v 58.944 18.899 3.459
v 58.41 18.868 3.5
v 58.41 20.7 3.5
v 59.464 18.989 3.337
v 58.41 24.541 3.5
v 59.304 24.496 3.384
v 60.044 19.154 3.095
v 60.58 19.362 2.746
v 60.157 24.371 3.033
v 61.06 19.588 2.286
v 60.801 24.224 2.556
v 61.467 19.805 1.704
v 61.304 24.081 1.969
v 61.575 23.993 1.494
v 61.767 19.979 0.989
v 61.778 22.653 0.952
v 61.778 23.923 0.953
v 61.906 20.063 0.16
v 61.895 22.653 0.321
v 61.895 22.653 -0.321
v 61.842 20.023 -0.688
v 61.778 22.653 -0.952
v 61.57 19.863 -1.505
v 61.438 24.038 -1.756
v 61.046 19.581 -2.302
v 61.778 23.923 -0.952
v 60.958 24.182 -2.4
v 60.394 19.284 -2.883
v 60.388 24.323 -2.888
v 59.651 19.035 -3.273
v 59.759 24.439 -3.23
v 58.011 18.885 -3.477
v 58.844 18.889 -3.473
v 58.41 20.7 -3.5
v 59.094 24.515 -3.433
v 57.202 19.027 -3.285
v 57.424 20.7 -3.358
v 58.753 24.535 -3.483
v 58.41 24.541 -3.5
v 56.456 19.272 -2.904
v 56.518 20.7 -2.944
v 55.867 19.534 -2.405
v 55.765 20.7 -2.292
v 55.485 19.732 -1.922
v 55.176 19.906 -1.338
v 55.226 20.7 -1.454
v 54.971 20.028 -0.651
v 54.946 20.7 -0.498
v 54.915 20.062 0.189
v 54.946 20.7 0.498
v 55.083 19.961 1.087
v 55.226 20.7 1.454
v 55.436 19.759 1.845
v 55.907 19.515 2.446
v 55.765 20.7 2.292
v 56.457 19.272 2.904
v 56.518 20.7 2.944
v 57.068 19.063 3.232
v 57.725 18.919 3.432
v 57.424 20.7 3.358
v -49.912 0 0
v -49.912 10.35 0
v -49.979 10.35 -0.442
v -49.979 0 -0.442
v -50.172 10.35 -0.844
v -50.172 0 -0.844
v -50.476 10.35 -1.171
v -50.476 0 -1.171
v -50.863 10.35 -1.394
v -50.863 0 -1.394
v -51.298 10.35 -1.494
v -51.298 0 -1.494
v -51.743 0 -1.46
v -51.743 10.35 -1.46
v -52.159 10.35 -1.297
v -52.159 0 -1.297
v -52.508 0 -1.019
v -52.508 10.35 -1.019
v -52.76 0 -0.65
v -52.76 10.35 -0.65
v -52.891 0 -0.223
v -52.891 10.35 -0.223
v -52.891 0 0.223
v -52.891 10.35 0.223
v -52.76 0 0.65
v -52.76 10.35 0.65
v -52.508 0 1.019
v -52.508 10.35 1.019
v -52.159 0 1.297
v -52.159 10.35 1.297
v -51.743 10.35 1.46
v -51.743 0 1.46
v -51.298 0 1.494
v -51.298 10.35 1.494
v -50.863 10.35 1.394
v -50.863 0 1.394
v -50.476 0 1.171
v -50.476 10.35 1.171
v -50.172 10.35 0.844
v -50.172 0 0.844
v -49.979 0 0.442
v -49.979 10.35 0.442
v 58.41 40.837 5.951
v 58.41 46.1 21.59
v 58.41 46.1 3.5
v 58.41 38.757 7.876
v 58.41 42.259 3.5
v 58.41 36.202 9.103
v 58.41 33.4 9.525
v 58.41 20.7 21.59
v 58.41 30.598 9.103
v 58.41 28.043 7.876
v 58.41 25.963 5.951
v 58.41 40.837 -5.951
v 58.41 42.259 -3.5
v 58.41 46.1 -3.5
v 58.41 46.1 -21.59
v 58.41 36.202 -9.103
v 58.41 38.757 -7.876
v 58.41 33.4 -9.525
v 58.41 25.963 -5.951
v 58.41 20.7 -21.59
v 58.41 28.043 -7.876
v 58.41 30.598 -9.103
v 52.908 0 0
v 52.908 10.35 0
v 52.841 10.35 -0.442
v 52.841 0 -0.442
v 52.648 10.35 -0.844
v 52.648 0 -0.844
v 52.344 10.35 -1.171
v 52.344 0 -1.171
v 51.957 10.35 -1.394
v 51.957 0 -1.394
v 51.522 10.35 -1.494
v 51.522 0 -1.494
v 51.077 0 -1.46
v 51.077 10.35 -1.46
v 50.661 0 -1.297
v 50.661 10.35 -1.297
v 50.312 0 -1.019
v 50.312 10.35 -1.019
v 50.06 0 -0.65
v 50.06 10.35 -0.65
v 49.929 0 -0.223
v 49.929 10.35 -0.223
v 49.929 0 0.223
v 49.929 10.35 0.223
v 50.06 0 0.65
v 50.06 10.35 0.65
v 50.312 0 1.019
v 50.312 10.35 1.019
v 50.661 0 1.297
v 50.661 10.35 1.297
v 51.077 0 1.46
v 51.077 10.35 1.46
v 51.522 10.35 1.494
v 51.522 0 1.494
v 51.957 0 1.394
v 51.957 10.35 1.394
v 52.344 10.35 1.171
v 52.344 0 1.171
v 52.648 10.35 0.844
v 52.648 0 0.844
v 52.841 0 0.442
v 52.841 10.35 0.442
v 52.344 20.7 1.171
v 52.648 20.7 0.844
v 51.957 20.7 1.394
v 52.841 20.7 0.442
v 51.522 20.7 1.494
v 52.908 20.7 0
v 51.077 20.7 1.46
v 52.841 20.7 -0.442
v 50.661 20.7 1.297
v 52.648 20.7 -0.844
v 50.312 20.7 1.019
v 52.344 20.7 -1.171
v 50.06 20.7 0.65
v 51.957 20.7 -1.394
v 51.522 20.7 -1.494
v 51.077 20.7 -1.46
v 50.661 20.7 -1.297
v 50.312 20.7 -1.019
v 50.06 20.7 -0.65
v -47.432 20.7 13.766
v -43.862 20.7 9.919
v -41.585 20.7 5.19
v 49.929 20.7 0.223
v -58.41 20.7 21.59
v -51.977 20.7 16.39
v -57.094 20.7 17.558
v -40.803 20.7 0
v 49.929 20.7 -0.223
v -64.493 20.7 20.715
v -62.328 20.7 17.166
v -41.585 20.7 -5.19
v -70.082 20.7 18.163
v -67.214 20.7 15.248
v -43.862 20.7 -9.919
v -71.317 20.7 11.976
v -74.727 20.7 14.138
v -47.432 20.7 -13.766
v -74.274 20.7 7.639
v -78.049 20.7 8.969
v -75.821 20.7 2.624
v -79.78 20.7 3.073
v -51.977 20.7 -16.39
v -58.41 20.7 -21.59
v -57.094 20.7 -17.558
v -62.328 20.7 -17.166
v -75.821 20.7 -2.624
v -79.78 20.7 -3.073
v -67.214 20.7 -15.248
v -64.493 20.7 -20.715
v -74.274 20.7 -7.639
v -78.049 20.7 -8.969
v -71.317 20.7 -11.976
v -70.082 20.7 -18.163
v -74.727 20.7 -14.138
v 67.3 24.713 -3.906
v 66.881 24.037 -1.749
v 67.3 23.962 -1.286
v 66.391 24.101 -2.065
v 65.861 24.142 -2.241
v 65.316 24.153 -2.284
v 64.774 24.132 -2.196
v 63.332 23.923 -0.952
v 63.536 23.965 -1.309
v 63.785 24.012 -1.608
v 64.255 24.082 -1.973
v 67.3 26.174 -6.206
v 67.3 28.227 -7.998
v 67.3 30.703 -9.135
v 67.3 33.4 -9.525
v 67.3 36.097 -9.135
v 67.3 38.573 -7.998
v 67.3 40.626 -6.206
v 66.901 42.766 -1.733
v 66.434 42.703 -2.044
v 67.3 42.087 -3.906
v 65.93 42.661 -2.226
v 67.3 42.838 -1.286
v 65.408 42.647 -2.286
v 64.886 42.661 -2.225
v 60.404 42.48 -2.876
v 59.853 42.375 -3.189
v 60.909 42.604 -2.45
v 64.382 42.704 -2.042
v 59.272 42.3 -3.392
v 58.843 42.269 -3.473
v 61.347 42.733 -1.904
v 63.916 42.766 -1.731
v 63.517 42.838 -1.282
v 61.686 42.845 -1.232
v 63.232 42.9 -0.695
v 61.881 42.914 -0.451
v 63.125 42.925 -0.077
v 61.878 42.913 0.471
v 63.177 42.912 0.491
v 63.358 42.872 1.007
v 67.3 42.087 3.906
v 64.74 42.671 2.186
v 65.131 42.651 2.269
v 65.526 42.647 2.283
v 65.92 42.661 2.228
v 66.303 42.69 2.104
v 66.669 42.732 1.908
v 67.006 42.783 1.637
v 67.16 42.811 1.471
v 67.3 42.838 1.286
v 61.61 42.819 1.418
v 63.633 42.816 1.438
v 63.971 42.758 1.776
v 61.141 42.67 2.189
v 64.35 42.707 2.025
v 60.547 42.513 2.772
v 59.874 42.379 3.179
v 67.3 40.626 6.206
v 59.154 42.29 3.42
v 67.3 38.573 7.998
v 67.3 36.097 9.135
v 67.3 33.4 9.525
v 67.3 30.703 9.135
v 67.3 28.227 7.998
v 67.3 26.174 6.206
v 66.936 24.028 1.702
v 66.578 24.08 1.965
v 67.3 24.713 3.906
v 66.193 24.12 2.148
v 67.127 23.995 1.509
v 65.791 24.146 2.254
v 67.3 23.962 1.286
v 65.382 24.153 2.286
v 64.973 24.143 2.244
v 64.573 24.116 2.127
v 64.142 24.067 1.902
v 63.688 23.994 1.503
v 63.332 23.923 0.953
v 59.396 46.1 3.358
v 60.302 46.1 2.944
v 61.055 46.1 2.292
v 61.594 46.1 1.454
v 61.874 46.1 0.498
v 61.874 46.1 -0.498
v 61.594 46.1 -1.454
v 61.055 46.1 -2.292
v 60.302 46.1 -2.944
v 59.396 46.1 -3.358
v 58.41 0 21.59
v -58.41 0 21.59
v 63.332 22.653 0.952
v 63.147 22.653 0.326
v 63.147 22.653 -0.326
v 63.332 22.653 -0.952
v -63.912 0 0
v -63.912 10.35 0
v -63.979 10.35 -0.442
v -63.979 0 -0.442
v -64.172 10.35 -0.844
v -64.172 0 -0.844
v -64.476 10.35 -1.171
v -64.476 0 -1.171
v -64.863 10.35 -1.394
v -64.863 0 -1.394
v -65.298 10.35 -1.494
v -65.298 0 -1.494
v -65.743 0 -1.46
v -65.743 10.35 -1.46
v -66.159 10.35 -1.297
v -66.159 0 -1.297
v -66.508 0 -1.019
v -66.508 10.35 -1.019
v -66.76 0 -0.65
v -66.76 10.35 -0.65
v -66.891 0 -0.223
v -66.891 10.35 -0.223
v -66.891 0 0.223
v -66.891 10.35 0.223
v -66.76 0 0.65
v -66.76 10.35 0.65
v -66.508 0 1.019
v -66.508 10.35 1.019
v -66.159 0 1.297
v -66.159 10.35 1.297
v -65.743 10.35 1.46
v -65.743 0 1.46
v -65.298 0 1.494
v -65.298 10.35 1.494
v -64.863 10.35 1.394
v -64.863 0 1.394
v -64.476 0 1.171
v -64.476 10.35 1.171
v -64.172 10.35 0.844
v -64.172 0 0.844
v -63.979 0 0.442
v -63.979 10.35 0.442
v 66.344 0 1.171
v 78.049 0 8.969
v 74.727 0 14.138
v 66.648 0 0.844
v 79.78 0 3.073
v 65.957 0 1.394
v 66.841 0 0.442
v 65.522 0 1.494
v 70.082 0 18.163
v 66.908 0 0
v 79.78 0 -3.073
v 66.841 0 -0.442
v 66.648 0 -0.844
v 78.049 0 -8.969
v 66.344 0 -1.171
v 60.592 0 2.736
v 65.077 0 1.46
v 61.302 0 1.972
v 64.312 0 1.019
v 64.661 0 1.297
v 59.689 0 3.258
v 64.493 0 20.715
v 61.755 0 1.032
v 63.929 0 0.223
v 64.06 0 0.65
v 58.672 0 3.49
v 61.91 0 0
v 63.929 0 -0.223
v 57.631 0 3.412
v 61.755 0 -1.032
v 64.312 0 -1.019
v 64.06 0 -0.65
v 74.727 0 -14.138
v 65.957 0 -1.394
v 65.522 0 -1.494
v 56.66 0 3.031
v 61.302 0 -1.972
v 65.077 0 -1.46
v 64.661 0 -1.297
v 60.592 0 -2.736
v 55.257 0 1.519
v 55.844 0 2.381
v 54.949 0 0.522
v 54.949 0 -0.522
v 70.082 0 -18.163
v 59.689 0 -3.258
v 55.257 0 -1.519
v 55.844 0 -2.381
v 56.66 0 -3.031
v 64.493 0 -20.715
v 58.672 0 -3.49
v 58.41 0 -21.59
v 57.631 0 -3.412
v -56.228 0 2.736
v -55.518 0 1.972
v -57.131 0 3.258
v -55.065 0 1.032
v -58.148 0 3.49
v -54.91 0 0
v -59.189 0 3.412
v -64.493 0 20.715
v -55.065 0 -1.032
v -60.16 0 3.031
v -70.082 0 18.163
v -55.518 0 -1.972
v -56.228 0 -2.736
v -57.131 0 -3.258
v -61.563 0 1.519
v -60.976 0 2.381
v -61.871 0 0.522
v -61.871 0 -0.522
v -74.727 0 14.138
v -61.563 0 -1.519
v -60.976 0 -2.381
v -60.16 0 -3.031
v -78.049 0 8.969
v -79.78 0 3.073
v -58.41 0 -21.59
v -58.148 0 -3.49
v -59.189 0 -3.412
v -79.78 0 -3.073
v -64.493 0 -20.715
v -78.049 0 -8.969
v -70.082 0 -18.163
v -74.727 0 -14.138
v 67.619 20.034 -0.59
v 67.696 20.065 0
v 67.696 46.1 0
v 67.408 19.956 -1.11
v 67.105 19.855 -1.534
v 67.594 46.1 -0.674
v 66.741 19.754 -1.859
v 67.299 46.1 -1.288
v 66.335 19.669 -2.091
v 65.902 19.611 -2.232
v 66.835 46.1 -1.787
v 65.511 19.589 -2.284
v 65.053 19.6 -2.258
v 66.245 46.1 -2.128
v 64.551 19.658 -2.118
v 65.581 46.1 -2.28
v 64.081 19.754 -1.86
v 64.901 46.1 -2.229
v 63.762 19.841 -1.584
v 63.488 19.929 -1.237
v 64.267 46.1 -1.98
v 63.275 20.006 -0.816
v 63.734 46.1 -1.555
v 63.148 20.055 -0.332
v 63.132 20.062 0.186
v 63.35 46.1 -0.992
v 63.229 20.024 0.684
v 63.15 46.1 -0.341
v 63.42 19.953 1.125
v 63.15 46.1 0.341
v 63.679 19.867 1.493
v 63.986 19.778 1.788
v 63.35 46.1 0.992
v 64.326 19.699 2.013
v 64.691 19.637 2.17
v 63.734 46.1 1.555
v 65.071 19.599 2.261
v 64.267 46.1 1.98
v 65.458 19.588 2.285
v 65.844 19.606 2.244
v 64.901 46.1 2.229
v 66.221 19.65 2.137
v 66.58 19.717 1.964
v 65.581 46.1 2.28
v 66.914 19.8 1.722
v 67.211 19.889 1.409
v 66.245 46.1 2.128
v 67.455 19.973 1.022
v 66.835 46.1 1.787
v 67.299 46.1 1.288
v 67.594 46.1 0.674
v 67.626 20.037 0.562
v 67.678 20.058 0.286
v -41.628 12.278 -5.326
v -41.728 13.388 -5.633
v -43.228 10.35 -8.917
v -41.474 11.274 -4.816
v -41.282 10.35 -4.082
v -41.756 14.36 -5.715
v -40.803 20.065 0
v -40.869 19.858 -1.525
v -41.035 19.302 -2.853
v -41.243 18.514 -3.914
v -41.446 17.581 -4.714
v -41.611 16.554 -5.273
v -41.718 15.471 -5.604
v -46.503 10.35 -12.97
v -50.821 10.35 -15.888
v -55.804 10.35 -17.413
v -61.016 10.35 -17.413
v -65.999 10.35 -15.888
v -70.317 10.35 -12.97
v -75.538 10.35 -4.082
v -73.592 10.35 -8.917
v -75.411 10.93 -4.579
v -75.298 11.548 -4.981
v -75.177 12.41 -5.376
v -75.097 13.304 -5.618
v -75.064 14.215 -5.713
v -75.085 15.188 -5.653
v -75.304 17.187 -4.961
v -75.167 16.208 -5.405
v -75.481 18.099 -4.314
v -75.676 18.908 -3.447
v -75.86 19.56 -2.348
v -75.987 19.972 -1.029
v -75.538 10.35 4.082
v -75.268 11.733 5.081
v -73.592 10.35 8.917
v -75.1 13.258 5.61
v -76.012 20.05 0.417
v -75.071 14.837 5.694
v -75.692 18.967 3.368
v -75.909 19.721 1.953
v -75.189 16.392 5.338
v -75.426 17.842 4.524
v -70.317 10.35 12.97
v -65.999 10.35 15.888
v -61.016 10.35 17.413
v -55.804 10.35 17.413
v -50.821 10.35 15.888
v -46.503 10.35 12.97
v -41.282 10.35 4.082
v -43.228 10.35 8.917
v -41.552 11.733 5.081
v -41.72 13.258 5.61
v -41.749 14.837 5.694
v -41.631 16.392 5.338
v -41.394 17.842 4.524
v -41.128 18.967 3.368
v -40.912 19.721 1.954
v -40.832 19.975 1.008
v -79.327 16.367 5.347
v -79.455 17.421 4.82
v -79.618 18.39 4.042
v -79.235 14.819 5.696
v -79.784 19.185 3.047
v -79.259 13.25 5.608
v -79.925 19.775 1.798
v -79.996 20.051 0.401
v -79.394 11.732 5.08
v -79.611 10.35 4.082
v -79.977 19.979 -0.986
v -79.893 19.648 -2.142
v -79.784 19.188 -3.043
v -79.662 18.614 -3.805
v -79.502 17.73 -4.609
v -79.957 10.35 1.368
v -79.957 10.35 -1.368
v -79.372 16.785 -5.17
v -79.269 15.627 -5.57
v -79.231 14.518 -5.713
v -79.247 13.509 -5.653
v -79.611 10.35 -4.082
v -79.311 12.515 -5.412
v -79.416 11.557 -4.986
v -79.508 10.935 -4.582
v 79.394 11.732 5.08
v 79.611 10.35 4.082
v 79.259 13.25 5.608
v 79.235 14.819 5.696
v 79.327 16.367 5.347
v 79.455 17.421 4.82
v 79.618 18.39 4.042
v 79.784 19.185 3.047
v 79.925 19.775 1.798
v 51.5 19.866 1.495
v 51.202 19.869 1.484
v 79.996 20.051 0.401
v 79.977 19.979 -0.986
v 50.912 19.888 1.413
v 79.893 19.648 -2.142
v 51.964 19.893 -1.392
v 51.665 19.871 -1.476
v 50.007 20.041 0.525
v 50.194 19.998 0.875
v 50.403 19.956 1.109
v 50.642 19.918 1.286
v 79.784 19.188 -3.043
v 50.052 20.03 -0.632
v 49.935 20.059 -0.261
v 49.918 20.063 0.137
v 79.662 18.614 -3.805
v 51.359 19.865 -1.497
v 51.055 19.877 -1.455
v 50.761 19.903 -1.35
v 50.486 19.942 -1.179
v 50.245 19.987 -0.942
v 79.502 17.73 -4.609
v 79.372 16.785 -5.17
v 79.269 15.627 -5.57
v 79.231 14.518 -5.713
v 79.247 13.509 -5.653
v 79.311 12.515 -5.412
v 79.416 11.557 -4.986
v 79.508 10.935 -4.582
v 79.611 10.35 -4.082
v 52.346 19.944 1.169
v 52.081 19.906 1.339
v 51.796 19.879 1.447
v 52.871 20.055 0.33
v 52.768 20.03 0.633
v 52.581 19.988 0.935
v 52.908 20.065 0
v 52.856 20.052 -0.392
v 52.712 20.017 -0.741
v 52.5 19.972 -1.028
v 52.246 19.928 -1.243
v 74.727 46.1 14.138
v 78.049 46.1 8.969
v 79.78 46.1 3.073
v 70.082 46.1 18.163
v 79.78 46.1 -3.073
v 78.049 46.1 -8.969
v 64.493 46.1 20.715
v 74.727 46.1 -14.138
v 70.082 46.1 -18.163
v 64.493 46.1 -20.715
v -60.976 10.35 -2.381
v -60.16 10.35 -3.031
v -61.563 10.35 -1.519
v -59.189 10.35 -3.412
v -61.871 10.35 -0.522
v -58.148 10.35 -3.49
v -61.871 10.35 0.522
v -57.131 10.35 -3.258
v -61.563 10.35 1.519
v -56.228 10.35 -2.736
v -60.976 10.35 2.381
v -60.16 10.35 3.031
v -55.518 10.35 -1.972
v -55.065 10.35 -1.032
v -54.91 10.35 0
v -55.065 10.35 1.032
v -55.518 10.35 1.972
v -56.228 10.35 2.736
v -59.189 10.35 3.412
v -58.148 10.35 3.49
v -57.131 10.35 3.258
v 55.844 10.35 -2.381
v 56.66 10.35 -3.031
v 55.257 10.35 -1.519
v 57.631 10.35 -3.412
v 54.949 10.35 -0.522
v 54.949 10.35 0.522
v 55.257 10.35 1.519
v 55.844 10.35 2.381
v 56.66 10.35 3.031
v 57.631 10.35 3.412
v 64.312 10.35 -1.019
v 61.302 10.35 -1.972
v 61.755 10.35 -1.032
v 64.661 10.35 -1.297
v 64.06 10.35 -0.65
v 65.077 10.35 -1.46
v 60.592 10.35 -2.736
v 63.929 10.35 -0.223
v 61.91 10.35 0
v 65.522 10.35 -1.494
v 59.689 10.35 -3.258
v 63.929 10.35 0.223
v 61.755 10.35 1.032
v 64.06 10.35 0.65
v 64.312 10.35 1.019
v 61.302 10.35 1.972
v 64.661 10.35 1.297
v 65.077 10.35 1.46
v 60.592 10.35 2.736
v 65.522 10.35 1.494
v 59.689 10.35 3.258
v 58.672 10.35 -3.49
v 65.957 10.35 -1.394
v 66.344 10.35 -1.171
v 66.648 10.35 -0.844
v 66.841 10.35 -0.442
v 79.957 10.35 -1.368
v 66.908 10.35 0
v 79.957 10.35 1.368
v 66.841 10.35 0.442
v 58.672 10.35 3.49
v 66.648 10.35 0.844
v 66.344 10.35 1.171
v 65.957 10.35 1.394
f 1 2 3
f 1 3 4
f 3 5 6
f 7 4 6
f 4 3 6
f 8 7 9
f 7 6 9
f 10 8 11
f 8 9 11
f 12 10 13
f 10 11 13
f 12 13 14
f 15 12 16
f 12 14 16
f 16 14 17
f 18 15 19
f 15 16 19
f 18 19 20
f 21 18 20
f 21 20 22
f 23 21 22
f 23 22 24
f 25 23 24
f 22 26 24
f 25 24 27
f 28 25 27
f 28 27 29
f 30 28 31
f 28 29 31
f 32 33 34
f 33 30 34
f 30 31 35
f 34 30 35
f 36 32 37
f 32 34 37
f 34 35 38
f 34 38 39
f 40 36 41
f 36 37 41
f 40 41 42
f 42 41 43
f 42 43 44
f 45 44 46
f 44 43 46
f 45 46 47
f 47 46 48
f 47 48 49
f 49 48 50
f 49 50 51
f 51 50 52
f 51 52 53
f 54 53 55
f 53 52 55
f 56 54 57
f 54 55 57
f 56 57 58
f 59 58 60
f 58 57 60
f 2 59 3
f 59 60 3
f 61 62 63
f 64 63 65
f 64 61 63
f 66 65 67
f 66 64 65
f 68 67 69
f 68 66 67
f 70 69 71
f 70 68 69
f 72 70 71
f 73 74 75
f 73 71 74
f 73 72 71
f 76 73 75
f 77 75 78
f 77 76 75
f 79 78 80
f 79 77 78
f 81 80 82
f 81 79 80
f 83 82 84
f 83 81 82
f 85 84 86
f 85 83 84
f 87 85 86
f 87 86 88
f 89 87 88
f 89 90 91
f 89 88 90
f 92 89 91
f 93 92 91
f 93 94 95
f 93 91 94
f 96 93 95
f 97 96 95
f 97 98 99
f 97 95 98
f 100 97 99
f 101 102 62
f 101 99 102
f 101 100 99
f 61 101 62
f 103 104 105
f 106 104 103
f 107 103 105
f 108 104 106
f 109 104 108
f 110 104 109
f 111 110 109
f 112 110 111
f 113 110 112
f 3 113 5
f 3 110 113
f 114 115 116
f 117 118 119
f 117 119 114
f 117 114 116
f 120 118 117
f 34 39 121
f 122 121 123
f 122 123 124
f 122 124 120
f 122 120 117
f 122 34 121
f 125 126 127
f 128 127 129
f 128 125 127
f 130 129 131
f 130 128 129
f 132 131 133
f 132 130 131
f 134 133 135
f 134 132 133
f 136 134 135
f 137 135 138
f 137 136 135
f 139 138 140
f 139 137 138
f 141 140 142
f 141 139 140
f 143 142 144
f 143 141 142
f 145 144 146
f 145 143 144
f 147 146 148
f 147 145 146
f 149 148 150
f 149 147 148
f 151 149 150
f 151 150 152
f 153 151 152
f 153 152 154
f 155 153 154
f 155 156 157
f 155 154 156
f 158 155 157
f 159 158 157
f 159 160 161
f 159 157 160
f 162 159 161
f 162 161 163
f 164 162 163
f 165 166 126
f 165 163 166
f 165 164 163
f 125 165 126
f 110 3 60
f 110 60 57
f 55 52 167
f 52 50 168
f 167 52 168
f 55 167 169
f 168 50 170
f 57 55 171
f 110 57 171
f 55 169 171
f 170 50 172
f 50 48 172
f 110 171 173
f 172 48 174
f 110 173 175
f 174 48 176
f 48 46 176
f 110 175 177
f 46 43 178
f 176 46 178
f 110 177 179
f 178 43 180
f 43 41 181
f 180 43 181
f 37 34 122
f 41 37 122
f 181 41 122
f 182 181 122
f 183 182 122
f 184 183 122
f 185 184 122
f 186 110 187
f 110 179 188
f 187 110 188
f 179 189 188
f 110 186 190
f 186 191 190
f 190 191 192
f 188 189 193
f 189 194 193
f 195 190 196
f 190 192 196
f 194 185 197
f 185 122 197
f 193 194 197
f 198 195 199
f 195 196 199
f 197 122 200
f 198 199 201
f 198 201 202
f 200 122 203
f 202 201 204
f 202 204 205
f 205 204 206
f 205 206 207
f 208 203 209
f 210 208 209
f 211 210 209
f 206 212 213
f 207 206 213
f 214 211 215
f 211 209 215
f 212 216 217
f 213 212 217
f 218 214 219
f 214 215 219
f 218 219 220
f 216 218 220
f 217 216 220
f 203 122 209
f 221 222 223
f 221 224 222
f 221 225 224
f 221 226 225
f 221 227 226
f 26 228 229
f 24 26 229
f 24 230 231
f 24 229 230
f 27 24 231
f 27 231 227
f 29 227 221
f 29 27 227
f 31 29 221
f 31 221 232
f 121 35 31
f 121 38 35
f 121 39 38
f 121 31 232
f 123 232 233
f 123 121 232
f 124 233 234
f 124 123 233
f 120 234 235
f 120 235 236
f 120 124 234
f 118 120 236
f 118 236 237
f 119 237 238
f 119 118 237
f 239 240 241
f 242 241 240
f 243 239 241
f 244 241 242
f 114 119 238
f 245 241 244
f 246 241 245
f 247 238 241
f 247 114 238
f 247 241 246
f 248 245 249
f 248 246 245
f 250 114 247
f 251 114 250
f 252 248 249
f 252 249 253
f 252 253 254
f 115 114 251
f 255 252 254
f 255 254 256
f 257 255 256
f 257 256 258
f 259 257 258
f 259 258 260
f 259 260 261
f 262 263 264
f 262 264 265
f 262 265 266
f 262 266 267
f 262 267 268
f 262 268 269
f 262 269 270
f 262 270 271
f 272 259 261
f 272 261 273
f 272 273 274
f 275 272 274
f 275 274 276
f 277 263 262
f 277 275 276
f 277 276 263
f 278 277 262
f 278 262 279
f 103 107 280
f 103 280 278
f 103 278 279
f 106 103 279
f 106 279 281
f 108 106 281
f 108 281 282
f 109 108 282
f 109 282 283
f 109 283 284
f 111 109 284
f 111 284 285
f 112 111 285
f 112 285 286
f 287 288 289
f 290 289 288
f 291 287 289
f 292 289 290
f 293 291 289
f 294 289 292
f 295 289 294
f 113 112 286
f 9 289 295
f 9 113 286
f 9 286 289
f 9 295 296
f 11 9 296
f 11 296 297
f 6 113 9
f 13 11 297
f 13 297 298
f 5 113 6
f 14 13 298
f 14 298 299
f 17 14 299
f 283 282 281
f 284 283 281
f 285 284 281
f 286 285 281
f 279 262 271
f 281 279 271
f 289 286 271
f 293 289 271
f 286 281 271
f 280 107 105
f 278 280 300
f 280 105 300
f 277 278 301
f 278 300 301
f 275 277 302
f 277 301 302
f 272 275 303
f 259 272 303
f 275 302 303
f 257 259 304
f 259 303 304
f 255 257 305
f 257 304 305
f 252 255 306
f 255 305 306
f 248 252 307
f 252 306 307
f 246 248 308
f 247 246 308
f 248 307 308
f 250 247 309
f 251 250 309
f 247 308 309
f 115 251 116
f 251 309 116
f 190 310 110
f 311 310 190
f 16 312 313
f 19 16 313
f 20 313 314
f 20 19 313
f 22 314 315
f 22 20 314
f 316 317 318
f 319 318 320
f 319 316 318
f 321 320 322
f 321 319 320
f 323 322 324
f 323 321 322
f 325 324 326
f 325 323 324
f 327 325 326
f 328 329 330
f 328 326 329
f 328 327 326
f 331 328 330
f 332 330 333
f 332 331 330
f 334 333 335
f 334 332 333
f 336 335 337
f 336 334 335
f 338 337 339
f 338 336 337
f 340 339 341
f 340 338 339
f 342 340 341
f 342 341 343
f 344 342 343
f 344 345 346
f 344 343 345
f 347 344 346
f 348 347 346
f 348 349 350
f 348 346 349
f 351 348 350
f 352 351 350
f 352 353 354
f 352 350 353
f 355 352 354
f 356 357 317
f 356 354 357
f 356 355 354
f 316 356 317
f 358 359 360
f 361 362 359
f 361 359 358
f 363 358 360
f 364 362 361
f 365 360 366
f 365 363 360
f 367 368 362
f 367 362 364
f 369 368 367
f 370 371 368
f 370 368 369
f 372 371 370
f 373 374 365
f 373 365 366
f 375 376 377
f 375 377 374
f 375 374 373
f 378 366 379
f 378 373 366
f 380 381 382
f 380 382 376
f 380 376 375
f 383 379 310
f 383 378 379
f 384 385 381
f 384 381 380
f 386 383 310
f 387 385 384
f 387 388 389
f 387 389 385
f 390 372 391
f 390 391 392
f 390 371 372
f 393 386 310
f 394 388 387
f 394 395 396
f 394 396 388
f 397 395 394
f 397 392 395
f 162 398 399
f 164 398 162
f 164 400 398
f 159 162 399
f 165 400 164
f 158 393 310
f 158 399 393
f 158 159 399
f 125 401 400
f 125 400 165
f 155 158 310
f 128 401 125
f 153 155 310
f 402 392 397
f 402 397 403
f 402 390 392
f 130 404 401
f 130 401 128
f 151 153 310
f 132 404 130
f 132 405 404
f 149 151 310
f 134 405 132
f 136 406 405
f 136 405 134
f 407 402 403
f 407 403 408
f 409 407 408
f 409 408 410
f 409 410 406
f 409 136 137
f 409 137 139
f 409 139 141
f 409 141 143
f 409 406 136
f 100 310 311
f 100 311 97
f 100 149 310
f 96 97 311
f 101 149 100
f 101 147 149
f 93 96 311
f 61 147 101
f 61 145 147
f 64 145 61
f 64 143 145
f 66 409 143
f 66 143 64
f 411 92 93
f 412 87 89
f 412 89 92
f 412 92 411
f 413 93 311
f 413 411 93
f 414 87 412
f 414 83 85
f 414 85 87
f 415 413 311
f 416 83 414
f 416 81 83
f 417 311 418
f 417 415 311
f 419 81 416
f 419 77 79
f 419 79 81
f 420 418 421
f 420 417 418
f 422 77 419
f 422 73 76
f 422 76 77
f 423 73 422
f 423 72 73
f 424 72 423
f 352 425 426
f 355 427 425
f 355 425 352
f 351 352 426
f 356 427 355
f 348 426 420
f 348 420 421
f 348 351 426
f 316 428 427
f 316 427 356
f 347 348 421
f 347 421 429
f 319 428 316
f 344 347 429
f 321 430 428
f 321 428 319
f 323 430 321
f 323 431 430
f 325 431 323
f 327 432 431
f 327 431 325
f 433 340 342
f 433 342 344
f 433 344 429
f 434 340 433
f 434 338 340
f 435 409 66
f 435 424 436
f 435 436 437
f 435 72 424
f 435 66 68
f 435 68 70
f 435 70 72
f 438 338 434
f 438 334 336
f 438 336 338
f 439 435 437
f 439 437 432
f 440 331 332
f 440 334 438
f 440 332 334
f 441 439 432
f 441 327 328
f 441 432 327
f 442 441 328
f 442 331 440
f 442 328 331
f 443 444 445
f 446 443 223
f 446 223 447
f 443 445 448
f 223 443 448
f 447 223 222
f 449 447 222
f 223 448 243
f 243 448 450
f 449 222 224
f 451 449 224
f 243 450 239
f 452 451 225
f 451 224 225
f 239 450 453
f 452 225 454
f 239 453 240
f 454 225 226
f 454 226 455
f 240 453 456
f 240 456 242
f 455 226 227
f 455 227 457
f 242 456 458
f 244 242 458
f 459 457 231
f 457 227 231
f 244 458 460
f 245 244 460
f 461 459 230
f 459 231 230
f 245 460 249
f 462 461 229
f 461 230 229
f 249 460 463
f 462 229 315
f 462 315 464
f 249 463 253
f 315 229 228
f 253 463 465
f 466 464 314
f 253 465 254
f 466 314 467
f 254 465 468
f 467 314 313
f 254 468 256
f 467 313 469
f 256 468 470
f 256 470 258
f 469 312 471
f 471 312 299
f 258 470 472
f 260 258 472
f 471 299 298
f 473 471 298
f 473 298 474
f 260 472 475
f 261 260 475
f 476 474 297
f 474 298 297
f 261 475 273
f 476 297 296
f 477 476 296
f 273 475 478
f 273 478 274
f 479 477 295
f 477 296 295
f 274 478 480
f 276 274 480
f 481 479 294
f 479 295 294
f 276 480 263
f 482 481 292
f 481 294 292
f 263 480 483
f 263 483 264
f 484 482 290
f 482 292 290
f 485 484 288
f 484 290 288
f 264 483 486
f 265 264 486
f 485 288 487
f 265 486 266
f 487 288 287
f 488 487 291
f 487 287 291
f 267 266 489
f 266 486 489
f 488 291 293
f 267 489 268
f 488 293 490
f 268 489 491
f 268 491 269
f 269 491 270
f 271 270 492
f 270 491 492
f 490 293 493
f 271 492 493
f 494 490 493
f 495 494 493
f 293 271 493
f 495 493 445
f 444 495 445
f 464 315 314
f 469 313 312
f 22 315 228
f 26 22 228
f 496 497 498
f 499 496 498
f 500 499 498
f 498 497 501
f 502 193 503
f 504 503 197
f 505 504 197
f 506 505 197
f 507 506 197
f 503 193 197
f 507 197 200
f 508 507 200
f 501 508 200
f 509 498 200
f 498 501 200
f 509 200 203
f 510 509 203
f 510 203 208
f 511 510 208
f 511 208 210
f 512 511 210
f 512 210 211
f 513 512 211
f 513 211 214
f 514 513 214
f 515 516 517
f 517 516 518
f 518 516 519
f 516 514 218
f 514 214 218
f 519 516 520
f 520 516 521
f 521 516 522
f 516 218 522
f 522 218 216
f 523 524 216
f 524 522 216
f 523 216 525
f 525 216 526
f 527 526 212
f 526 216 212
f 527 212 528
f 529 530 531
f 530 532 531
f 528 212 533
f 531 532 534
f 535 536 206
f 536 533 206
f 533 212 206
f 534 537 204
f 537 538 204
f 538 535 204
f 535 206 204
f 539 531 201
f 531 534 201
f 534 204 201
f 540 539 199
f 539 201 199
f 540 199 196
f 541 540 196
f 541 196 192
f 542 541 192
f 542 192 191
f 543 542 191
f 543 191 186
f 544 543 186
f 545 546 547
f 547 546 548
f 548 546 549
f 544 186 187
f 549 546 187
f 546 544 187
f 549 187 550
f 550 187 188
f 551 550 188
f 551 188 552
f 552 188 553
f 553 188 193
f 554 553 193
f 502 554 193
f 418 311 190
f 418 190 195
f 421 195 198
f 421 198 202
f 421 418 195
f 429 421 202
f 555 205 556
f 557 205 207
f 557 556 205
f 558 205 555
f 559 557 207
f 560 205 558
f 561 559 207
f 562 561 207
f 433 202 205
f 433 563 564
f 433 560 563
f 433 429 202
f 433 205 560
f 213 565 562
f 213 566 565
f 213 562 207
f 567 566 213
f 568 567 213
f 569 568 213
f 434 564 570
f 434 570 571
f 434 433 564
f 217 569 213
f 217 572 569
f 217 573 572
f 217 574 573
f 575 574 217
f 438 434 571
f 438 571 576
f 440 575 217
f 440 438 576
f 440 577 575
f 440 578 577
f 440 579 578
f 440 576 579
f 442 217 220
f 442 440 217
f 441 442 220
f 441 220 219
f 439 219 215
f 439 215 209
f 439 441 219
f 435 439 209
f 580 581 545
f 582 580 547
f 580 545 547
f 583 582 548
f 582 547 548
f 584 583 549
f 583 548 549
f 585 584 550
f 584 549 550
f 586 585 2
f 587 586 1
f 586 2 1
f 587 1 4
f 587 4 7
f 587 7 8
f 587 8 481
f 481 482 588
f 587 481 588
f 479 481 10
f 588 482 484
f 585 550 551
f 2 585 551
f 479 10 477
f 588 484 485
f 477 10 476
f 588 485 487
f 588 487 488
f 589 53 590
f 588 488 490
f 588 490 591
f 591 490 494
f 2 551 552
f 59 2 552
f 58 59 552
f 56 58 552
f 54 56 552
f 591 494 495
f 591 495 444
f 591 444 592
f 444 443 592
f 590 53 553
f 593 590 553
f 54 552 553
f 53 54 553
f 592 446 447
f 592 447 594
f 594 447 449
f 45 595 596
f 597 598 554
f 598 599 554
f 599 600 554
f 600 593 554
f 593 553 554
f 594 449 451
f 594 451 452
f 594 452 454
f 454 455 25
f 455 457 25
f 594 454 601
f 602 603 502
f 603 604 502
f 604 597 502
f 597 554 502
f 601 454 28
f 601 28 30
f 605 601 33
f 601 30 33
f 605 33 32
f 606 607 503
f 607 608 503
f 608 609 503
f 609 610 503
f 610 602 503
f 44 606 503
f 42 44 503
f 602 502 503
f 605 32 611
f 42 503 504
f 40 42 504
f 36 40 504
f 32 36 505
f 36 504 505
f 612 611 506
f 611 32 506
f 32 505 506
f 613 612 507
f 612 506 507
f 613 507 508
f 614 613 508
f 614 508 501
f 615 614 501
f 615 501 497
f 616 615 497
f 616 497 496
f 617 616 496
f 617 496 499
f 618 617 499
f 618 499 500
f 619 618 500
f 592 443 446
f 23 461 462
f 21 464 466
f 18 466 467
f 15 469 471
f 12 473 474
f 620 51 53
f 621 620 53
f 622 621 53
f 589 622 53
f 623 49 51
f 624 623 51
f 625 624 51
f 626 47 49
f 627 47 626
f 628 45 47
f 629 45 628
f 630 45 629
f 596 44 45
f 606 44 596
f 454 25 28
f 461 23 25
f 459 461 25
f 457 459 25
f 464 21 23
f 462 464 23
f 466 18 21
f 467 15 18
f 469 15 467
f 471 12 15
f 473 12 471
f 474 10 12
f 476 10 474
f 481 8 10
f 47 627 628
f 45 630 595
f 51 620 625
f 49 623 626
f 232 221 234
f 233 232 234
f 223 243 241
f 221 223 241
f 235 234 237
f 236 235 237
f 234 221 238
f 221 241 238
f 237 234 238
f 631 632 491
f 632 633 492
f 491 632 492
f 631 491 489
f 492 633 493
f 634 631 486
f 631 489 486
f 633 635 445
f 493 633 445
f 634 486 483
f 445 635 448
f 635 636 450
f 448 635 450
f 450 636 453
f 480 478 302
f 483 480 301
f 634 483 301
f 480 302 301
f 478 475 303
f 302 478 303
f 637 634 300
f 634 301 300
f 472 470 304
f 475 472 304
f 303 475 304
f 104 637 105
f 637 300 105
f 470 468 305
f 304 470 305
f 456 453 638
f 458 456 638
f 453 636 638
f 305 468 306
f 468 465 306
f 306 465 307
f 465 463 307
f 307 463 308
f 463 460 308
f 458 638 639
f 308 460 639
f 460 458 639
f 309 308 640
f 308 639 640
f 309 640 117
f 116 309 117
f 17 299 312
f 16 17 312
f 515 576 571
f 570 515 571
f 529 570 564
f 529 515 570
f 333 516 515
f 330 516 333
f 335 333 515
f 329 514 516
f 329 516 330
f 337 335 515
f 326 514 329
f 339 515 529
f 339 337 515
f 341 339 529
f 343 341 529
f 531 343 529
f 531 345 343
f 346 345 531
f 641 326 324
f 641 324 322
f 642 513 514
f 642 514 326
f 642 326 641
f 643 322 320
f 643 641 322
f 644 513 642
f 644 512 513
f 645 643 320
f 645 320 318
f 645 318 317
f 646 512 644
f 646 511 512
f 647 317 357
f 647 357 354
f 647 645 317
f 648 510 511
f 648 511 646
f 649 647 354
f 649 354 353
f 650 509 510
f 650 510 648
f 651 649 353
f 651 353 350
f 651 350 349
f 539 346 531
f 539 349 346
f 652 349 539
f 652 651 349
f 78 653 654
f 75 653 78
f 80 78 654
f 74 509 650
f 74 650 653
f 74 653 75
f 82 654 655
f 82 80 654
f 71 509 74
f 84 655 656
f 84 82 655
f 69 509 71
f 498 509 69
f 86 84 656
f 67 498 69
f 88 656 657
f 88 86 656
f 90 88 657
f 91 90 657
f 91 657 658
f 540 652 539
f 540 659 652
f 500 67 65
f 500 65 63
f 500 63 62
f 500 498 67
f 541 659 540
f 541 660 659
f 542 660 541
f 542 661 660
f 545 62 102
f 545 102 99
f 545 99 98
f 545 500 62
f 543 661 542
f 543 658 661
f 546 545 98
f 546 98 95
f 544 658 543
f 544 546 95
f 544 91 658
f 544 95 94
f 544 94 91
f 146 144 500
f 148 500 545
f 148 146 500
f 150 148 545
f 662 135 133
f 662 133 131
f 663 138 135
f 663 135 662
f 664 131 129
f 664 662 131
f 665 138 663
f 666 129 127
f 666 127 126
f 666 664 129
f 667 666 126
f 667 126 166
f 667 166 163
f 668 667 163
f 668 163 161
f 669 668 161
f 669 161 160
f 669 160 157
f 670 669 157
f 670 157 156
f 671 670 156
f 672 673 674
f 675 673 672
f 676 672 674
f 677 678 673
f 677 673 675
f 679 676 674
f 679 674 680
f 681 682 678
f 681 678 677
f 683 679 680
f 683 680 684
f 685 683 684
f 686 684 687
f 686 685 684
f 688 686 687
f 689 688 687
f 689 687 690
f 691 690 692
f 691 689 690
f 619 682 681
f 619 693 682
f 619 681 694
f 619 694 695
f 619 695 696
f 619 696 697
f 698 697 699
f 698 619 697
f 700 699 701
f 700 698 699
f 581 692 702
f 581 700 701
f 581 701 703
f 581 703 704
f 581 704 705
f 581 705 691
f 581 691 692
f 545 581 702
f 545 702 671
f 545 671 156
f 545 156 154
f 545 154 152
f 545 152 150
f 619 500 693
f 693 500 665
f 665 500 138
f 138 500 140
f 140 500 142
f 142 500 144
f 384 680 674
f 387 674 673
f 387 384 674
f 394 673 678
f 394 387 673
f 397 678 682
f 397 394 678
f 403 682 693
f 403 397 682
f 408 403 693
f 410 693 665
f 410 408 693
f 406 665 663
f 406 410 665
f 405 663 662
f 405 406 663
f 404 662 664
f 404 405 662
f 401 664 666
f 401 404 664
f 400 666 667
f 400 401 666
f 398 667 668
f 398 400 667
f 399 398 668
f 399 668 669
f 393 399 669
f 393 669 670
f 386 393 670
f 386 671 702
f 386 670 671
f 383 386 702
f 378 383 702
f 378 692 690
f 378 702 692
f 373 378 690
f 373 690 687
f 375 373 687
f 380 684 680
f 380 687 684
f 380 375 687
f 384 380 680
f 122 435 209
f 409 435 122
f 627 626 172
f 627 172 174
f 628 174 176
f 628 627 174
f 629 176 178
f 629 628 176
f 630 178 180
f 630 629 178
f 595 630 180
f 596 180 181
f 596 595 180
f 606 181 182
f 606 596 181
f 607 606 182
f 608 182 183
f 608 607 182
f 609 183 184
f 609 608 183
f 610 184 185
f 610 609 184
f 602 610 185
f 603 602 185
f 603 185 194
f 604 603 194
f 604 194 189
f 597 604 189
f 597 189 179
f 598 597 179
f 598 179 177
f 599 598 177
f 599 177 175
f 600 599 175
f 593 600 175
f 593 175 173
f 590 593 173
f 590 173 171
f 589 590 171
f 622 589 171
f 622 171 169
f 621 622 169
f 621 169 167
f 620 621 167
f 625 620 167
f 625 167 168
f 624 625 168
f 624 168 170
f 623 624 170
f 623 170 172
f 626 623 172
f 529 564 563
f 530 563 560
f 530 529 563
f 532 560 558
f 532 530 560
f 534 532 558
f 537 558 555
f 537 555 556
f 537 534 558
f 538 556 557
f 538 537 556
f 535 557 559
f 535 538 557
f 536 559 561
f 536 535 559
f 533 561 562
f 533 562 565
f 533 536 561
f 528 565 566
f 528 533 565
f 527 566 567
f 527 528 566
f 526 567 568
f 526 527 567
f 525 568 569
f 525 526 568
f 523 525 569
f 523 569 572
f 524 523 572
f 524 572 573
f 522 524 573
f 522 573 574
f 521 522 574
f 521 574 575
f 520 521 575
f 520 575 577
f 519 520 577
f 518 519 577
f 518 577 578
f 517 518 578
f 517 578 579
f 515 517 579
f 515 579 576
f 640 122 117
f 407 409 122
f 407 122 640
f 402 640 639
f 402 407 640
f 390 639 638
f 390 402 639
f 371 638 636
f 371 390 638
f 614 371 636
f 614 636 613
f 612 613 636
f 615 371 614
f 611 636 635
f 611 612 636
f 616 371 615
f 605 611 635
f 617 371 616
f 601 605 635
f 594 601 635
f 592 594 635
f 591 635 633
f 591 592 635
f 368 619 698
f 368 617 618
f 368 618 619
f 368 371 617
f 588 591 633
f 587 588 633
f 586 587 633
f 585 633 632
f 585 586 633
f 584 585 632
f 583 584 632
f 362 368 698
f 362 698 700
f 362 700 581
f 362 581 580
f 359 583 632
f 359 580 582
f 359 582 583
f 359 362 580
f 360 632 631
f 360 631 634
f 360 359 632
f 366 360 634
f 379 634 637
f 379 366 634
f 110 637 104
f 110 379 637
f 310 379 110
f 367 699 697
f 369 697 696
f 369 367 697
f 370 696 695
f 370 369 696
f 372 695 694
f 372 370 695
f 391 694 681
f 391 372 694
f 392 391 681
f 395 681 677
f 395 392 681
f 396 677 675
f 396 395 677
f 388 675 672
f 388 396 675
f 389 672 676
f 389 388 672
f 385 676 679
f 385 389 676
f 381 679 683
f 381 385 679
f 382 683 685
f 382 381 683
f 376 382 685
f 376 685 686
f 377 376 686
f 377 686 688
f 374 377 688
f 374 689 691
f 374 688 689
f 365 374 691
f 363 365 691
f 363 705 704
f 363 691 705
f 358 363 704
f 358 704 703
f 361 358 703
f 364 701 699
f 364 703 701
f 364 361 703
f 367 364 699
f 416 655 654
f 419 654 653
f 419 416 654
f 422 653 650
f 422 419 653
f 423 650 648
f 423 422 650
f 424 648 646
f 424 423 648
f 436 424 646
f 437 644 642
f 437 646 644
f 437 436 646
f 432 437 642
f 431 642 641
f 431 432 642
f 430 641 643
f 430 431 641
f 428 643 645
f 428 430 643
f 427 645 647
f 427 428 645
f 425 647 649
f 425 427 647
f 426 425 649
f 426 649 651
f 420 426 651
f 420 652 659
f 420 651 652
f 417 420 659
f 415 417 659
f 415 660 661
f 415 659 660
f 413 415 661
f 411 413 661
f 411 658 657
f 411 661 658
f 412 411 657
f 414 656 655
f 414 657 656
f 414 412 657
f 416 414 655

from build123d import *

# Parameters (mm, degrees)
SKETCH1_R               = 3.5
SKETCH1_R_2             = 1.498001977
BOSS_EXTRUDE1_DEPTH     = 20.7
SKETCH2_R               = 17.607245412
CUT_EXTRUDE1_DEPTH      = 10.349992
CUT_EXTRUDE2_DEPTH      = 81
CUT_EXTRUDE2_DEPTH_BACK = 81
SKETCH4_R               = 1.498001977
BOSS_EXTRUDE2_DEPTH     = 25.4
CUT_EXTRUDE3_DEPTH      = 8.89
CUT_EXTRUDE4_DEPTH      = 46.1
SKETCH7_R               = 2.286
CUT_EXTRUDE5_DEPTH      = 35.749992


with BuildPart() as part:
    # Sketch1 → Boss-Extrude1 (new body)
    with BuildSketch(Plane(origin=(0, 0, 0), x_dir=(1, 0, 0), z_dir=(0, 1, 0))):
        with BuildLine():
            Line((-58.41, 21.59), (58.41, 21.59))
            ThreePointArc((58.41, 21.59), (80, 0), (58.41, -21.59))
            Line((58.41, -21.59), (-58.41, -21.59))
            ThreePointArc((-58.41, -21.59), (-80, 0), (-58.41, 21.59))
        make_face()
        with Locations((-58.41, 0)):
            Circle(SKETCH1_R, mode=Mode.SUBTRACT)
        with Locations((-51.41, 0)):
            Circle(SKETCH1_R_2, mode=Mode.SUBTRACT)
        with Locations((-65.41, 0)):
            Circle(SKETCH1_R_2, mode=Mode.SUBTRACT)
        with Locations((51.41, 0)):
            Circle(SKETCH1_R_2, mode=Mode.SUBTRACT)
        with Locations((65.41, 0)):
            Circle(SKETCH1_R_2, mode=Mode.SUBTRACT)
        with Locations((58.41, 0)):
            Circle(SKETCH1_R, mode=Mode.SUBTRACT)
    extrude(amount=BOSS_EXTRUDE1_DEPTH)

    # Sketch2 → Cut-Extrude1 (cut)
    with BuildSketch(Plane(origin=(0, 20.7, 0), x_dir=(1, 0, 0), z_dir=(0, 1, 0))):
        with Locations((-58.41, 0)):
            Circle(SKETCH2_R)
    extrude(amount=-CUT_EXTRUDE1_DEPTH, mode=Mode.SUBTRACT)

    # Sketch3 → Cut-Extrude2 (cut, two sides)
    with BuildSketch(Plane(origin=(0, 0, 0), x_dir=(0, 0, -1), z_dir=(1, 0, 0))) as cut_extrude2_sk:
        with BuildLine():
            Line((4.081824225, 10.350008), (-4.081824225, 10.350008))
            ThreePointArc((-4.081824225, 10.350008), (0, 20.065), (4.081824225, 10.350008))
        make_face()
    extrude(amount=CUT_EXTRUDE2_DEPTH, mode=Mode.SUBTRACT)
    extrude(cut_extrude2_sk.sketch, amount=-CUT_EXTRUDE2_DEPTH_BACK, mode=Mode.SUBTRACT)

    # Sketch4 → Boss-Extrude2 (add)
    with BuildSketch(Plane(origin=(0, 20.7, 0), x_dir=(1, 0, 0), z_dir=(0, 1, 0))):
        with BuildLine():
            Line((58.41, -21.59), (58.41, 21.59))
            ThreePointArc((58.41, 21.59), (80, 0), (58.41, -21.59))
        make_face()
        with Locations((65.41, 0)):
            Circle(SKETCH4_R, mode=Mode.SUBTRACT)
    extrude(amount=BOSS_EXTRUDE2_DEPTH)

    # Sketch5 → Cut-Extrude3 (cut)
    with BuildSketch(Plane.ZY.offset(-58.41)):
        with BuildLine():
            Line((0.9525, 22.652744662), (-0.9525, 22.652744662))
            Line((-0.9525, 22.652744662), (-0.9525, 23.922744662))
            ThreePointArc((-0.9525, 23.922744662), (0, 42.925), (0.9525, 23.922744662))
            Line((0.9525, 23.922744662), (0.9525, 22.652744662))
        make_face()
    extrude(amount=-CUT_EXTRUDE3_DEPTH, mode=Mode.SUBTRACT)

    # Sketch6 → Cut-Extrude4 (cut)
    with BuildSketch(Plane(origin=(0, 46.1, 0), x_dir=(1, 0, 0), z_dir=(0, 1, 0))):
        with BuildLine():
            Line((58.41, -3.5), (58.41, 3.5))
            ThreePointArc((58.41, 3.5), (54.91, 0), (58.41, -3.5))
        make_face()
        with BuildLine():
            ThreePointArc((58.41, -3.5), (61.91, 0), (58.41, 3.5))
            Line((58.41, 3.5), (58.41, -3.5))
        make_face()
    extrude(amount=-CUT_EXTRUDE4_DEPTH, mode=Mode.SUBTRACT)

    # Sketch7 → Cut-Extrude5 (cut)
    with BuildSketch(Plane(origin=(0, 46.1, 0), x_dir=(1, 0, 0), z_dir=(0, 1, 0))):
        with Locations((65.41, 0)):
            Circle(SKETCH7_R)
    extrude(amount=-CUT_EXTRUDE5_DEPTH, mode=Mode.SUBTRACT)


solid = part.part
